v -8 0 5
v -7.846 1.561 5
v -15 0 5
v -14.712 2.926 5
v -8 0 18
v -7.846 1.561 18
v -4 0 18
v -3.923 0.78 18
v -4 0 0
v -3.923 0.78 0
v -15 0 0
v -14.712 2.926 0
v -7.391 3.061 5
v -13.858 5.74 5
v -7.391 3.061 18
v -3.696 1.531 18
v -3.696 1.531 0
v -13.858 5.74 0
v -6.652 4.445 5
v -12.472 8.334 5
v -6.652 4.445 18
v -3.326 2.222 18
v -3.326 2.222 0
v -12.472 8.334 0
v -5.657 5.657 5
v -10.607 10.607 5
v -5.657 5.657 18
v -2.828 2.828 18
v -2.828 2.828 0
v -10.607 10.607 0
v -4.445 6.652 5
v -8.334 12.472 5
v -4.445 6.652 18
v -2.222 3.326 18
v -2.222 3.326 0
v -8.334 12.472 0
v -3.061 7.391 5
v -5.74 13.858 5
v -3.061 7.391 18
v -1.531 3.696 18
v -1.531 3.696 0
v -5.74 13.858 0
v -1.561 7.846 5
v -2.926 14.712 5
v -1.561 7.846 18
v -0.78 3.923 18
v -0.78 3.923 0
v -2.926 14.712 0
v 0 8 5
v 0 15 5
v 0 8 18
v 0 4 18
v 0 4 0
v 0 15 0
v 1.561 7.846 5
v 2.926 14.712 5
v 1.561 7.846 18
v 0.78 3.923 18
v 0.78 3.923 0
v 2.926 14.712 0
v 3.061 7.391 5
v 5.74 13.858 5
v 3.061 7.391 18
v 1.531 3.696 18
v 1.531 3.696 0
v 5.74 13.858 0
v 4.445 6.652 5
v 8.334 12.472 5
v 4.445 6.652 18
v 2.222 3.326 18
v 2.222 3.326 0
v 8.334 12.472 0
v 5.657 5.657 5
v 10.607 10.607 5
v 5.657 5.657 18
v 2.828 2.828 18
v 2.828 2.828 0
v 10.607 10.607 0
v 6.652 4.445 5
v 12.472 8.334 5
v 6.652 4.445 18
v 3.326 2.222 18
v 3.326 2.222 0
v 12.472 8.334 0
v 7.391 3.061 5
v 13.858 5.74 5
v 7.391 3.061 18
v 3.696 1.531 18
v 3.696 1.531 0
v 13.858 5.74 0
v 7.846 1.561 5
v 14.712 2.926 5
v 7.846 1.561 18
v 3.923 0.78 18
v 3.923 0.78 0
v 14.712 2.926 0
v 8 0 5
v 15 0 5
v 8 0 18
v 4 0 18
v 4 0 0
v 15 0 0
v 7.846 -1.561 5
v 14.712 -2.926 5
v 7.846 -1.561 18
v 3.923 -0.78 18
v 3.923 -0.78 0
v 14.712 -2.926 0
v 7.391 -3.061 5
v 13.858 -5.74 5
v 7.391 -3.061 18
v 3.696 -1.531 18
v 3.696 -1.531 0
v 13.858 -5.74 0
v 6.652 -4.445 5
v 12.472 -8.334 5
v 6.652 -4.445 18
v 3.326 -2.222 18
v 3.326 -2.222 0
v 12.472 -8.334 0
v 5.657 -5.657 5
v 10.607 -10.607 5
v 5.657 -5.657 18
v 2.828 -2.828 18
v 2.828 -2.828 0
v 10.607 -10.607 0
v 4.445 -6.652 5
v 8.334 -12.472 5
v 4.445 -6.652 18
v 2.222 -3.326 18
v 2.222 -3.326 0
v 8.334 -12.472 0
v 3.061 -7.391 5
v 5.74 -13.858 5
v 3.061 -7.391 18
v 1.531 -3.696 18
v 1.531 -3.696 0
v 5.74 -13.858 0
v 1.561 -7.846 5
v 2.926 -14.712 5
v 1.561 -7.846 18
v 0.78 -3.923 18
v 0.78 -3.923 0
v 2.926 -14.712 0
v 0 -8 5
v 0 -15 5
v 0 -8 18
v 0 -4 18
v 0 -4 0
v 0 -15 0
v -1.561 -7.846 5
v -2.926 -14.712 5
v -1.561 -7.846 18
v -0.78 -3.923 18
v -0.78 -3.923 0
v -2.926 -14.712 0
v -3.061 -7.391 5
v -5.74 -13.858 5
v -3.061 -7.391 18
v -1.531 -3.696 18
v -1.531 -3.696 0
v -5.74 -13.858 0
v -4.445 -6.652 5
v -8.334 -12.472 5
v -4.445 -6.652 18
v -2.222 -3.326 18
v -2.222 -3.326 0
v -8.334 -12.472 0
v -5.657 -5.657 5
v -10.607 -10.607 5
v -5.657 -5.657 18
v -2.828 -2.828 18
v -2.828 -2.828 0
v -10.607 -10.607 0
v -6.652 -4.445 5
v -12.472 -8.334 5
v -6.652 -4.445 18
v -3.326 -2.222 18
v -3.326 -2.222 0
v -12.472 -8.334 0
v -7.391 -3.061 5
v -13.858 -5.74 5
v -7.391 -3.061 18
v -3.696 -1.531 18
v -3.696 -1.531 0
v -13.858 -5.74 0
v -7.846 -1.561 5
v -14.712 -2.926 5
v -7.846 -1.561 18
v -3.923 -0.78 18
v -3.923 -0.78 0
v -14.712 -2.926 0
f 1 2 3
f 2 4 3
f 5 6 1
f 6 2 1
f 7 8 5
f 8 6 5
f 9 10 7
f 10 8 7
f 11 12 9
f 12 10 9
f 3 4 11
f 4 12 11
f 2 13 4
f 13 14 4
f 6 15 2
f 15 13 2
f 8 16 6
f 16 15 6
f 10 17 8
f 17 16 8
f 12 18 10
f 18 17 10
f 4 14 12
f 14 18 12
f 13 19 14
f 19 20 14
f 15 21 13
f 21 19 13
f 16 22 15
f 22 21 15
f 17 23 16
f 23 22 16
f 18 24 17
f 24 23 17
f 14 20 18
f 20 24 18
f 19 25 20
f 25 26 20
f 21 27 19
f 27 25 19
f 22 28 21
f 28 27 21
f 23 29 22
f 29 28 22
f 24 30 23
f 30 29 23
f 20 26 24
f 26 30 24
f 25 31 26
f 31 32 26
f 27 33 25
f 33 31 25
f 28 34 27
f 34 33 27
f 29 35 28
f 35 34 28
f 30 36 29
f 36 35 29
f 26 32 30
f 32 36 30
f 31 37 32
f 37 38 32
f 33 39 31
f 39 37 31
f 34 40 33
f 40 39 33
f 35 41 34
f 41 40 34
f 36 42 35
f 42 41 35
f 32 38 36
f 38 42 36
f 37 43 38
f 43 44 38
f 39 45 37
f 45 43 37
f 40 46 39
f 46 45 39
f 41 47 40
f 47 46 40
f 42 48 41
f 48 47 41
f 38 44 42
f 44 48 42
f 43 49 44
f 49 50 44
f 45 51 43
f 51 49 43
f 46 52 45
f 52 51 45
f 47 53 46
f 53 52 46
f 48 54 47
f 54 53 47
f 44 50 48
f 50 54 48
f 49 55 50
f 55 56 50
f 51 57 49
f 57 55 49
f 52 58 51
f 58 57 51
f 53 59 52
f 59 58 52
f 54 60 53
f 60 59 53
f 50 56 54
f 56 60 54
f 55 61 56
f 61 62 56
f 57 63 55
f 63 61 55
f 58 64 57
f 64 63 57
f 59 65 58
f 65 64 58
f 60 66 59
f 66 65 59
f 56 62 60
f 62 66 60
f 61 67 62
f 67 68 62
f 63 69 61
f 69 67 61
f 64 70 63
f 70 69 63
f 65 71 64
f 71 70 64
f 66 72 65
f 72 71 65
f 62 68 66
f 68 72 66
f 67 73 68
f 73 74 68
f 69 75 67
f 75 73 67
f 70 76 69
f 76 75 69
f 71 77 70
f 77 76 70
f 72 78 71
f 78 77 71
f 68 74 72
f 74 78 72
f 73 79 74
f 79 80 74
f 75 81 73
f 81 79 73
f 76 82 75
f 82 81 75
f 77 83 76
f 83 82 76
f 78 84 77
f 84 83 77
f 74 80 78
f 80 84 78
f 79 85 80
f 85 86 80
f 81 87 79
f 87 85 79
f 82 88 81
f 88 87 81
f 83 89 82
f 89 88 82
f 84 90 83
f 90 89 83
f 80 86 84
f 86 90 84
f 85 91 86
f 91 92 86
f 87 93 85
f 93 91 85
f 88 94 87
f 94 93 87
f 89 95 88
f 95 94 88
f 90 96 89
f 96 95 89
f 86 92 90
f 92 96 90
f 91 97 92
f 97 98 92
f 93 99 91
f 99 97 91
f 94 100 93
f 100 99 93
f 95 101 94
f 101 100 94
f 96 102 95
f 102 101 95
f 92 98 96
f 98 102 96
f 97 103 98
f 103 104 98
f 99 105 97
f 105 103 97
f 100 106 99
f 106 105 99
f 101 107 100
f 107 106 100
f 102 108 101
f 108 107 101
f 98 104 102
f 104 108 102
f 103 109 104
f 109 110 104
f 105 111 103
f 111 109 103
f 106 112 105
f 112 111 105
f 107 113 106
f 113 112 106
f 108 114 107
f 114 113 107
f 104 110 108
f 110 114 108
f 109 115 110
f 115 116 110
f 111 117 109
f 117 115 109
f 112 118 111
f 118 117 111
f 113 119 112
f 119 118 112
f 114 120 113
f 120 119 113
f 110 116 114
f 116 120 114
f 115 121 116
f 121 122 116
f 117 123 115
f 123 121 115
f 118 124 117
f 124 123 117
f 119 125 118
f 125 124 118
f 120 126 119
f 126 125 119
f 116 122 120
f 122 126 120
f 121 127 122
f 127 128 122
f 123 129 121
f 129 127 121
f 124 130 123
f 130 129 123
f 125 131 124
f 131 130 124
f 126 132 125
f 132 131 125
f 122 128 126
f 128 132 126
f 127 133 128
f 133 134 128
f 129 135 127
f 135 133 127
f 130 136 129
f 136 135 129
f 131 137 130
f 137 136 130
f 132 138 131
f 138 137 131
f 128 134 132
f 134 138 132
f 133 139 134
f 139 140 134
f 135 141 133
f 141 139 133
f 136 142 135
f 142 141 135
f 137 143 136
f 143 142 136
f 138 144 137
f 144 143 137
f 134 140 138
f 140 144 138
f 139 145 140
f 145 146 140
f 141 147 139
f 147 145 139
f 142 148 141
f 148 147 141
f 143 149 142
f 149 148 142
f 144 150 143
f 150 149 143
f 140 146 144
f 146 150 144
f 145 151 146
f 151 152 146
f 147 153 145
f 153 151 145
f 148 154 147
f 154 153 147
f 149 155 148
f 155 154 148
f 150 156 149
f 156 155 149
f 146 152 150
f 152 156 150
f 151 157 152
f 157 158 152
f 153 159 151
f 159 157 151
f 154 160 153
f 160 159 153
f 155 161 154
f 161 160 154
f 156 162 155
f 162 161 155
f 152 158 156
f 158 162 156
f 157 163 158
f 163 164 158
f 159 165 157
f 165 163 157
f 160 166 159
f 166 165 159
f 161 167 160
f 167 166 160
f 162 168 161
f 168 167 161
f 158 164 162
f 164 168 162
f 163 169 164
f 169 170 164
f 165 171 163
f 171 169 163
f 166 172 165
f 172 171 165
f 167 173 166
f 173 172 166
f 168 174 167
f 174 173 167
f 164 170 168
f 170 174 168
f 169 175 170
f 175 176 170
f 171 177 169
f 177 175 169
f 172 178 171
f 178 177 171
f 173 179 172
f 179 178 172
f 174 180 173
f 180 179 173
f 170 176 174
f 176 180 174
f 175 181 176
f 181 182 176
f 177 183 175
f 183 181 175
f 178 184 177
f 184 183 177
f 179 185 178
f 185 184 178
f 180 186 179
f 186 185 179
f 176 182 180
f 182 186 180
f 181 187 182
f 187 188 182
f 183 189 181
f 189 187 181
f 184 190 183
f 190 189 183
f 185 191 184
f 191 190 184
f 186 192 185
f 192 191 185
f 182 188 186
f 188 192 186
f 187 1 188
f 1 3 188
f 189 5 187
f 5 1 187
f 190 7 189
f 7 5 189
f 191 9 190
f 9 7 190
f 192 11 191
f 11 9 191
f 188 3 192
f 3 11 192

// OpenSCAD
$fn = 32;

// ----------------------------------------------------------------------
// Arc stop: collar, 18 mm thick
// ----------------------------------------------------------------------

// --- parameters (mm) ---
revolve_angle = 360;      // full turn around the Z axis
profile_points = 6;       // points of the closed outline

profile = [[4, 0], [15, 0], [15, 5], [8, 5], [8, 18], [4, 18]];  // single closed polygon, 6 points, counter clockwise

// --- the one profile operation ---
rotate_extrude(angle = revolve_angle) polygon(points = profile);
